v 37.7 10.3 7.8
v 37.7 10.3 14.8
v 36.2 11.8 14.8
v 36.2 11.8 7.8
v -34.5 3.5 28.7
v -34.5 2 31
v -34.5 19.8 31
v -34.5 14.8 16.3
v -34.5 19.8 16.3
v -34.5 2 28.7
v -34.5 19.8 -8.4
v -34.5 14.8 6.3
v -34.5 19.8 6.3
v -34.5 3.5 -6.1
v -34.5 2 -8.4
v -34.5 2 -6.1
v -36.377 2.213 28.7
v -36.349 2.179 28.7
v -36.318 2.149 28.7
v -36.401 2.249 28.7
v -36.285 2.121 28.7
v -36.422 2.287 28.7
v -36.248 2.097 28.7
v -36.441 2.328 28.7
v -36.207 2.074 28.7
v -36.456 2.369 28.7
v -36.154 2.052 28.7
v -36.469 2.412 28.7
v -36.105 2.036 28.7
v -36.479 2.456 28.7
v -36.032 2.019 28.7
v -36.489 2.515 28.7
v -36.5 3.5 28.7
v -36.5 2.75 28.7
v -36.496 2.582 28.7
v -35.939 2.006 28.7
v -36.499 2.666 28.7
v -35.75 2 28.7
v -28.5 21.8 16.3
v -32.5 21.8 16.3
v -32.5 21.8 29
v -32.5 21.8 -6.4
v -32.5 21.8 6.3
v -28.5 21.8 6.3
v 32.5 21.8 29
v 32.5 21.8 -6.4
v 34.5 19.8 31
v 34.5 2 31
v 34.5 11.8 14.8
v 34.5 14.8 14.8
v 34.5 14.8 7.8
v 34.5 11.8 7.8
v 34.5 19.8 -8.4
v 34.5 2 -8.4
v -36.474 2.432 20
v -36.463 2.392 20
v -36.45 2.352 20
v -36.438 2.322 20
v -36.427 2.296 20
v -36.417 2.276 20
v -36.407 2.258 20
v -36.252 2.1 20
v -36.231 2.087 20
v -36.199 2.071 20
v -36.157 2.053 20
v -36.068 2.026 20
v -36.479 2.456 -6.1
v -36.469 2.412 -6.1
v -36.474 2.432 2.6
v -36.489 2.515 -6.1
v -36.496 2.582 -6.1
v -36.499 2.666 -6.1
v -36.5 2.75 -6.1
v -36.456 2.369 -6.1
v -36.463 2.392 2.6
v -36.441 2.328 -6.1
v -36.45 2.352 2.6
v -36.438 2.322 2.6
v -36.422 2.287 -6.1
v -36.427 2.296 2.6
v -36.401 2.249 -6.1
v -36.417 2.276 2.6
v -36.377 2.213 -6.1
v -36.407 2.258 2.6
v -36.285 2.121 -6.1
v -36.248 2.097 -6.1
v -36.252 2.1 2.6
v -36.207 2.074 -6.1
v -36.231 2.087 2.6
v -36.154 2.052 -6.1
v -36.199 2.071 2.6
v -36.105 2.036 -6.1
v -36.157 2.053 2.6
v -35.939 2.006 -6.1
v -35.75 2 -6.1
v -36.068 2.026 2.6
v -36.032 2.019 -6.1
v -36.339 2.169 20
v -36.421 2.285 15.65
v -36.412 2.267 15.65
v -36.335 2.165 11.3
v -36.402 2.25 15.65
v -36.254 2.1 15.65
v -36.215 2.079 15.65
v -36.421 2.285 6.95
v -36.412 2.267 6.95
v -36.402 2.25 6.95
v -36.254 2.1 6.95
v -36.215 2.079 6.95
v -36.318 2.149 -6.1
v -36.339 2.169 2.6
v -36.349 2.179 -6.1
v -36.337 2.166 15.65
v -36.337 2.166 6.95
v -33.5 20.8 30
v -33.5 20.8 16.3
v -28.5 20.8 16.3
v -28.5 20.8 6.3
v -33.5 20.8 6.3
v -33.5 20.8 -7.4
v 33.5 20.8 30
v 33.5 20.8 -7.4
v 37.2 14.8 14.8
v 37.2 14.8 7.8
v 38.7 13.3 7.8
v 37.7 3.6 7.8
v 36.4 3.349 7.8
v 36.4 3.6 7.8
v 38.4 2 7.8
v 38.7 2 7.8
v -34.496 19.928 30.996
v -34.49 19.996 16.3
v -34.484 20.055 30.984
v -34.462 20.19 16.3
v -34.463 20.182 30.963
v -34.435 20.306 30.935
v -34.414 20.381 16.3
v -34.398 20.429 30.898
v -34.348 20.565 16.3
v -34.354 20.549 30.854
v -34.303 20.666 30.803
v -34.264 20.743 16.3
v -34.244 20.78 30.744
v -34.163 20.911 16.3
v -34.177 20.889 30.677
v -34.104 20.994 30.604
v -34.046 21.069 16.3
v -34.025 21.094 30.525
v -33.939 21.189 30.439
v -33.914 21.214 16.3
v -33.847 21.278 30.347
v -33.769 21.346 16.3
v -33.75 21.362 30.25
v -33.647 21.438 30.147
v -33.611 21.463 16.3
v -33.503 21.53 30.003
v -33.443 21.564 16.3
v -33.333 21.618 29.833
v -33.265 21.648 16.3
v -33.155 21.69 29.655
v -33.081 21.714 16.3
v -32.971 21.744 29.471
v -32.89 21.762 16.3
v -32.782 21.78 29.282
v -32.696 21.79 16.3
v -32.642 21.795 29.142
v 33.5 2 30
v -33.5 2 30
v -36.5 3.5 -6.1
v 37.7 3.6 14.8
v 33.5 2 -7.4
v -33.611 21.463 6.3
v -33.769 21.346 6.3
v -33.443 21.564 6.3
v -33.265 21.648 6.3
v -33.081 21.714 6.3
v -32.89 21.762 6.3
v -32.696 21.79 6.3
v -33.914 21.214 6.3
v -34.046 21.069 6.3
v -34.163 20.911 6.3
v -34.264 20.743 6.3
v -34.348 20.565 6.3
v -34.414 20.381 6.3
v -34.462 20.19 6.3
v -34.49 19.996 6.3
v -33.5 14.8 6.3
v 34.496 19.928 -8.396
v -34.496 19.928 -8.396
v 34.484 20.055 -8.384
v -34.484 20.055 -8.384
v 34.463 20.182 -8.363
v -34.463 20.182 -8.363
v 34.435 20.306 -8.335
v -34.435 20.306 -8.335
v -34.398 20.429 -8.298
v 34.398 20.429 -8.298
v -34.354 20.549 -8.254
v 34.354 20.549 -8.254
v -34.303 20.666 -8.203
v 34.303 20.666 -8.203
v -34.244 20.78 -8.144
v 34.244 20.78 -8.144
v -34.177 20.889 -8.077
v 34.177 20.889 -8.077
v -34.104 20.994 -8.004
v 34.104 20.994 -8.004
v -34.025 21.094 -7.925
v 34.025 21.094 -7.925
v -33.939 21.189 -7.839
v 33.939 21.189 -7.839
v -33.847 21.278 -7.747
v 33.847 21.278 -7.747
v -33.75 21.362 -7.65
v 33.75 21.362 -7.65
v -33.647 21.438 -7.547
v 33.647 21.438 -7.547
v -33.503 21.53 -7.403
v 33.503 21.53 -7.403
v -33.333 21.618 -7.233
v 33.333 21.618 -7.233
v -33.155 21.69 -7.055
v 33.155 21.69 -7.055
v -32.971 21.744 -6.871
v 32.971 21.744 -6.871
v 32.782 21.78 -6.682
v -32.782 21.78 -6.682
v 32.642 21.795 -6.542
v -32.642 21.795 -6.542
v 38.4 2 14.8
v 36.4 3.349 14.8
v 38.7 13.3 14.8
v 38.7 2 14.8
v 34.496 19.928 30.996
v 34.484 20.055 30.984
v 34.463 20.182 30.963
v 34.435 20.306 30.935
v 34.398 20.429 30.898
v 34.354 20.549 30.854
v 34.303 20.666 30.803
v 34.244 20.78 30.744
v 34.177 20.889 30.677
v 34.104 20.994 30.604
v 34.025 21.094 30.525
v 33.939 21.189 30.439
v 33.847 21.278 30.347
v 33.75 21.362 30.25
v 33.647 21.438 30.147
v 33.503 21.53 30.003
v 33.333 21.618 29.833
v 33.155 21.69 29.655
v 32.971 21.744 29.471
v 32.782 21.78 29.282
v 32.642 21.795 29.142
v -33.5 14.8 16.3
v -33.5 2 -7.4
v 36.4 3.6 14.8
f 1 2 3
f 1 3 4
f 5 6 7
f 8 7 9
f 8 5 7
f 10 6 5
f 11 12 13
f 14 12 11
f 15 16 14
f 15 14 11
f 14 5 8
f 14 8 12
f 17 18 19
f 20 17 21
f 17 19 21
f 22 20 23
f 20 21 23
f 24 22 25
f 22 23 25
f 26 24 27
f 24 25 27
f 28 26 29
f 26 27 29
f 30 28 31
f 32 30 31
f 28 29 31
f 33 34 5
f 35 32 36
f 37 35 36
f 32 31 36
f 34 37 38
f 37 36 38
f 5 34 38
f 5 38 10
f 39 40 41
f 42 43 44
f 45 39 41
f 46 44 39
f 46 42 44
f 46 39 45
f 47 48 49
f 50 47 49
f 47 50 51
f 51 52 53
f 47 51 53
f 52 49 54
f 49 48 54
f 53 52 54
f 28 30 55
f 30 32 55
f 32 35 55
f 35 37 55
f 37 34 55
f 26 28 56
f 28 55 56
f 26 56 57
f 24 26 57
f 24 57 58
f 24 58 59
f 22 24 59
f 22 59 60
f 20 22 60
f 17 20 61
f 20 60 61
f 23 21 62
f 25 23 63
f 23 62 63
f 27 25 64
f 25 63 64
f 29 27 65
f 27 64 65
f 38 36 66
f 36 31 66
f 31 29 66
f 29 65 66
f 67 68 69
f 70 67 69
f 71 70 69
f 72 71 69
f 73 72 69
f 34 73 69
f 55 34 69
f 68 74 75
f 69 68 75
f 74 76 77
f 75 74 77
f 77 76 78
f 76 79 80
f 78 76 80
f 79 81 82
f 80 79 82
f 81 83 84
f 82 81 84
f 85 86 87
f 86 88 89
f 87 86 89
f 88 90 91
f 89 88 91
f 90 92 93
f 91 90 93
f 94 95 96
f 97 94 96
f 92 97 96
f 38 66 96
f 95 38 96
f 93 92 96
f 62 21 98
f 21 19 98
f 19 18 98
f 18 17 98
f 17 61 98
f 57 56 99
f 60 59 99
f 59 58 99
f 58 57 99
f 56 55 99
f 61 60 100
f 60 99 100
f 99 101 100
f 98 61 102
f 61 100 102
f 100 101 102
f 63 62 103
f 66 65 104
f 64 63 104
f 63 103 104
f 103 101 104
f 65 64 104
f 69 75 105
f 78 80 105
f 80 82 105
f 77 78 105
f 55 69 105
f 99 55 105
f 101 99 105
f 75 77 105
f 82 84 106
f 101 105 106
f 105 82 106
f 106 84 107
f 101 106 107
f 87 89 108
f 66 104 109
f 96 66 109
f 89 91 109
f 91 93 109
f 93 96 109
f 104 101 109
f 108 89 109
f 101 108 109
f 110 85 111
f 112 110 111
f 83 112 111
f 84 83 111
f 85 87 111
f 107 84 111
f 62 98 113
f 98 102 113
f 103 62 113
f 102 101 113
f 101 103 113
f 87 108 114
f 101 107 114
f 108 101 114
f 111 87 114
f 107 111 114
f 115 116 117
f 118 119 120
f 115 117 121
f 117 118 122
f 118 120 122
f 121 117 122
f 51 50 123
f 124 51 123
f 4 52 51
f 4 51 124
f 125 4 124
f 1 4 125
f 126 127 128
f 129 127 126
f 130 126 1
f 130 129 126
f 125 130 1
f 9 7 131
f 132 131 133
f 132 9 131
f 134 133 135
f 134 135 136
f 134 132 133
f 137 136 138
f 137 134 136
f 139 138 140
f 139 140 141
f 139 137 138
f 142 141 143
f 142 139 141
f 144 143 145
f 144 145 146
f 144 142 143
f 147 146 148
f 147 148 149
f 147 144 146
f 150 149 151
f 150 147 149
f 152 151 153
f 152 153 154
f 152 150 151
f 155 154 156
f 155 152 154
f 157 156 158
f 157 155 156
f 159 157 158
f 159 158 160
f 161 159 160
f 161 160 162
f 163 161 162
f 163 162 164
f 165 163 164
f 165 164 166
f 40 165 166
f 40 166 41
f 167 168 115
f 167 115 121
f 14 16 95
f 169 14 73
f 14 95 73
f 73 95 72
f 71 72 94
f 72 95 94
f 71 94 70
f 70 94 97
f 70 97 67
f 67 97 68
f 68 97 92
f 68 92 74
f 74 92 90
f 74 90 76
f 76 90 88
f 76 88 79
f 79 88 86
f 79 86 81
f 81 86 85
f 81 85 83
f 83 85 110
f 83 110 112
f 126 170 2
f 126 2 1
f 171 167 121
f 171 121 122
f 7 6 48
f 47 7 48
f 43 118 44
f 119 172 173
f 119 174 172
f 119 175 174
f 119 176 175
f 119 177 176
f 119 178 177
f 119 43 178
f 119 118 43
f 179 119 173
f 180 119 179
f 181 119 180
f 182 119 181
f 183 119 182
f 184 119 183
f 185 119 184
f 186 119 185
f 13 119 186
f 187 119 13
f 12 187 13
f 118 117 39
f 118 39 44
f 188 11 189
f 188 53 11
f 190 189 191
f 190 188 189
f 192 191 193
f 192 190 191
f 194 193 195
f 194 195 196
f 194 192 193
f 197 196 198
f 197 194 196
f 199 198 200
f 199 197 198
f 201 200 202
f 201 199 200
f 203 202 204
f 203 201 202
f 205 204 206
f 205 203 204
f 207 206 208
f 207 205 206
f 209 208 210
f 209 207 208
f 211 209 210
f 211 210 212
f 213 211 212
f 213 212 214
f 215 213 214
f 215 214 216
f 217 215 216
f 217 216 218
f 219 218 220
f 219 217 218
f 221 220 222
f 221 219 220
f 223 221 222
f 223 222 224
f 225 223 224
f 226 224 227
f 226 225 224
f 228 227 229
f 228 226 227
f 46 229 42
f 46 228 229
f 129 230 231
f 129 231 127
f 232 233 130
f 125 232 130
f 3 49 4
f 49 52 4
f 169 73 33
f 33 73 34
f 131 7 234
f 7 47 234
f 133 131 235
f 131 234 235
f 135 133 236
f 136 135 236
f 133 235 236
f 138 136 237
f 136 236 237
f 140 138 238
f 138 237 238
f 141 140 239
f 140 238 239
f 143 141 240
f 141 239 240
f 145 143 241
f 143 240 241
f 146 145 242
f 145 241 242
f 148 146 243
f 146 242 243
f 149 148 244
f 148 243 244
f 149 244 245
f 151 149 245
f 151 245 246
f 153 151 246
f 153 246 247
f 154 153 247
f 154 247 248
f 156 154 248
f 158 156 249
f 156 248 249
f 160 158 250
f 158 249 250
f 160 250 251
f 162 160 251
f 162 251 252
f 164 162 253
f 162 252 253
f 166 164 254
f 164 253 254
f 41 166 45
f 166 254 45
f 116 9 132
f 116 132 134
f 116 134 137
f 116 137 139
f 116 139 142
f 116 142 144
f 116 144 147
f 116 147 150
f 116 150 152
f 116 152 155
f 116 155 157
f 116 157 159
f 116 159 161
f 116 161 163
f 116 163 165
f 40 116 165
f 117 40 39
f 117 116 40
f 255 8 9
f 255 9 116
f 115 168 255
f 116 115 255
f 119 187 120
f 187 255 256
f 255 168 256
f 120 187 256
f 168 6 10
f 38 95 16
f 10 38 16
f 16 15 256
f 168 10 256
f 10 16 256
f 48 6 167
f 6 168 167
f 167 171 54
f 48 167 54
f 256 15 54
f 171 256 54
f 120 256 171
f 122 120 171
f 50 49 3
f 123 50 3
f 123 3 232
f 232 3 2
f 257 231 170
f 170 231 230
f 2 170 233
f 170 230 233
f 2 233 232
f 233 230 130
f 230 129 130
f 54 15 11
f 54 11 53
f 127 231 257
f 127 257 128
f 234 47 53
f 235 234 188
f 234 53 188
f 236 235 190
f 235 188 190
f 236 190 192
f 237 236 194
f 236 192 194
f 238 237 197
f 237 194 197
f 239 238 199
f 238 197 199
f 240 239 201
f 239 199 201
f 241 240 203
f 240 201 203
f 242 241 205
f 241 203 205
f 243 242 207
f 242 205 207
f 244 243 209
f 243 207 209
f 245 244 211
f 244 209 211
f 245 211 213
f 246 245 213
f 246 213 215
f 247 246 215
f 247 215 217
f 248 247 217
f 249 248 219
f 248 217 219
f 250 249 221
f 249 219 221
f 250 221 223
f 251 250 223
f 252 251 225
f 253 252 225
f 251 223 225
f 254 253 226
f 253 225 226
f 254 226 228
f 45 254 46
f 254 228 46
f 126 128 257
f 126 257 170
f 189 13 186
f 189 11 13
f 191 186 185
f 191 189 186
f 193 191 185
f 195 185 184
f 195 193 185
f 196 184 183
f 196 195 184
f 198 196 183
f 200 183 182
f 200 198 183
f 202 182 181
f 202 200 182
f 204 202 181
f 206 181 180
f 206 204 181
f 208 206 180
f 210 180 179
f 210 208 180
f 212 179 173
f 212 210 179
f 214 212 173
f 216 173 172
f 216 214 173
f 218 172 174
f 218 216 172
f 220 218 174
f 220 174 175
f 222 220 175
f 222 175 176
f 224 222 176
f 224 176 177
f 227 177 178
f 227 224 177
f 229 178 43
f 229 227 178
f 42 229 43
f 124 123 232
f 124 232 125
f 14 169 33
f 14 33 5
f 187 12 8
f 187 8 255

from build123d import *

# Parameters (mm, degrees)
EXTRUDE_THIN_START                    = 2
EXTRUDE_THIN_HOLDER_WALLS_OUTLINE_W   = 69
EXTRUDE_THIN_HOLDER_WALLS_OUTLINE_H   = 39.4
EXTRUDE_THIN_HOLDER_WALLS_OUTLINE_W_2 = 67
EXTRUDE_THIN_HOLDER_WALLS_OUTLINE_H_2 = 37.4
EXTRUDE_THIN_HOLDER_WALLS_DEPTH       = 19.8
BOSS_EXTRUDE_START                    = 20.8
BATTERY_HOLDER_AREA_8_W               = 28.6
BATTERY_HOLDER_AREA_8_H               = 37.4
BATTERY_HOLDER_AREA_8_W_2             = 5
BATTERY_HOLDER_AREA_8_H_2             = 10
BOSS_EXTRUDE_HOLDER_TOP_DEPTH         = 1
CUT_EXTRUDE_START                     = 14.8
BATTERY_HOLDER_AREA_6_W               = 1
BATTERY_HOLDER_AREA_6_H               = 10
BATTERY_HOLDER_AREA_6_W_2             = 5
CUT_EXTRUDE_BATTERY_CABLE_DEPTH       = 7
BOSS_EXTRUDE_START_2                  = 2
BOSS_EXTRUDE_SLIDE_CLAMP_DEPTH        = 1.5
FILLET_SLIDE_CLAMP_SIZE               = 0.75
FILLET_HOLDER_EDGES_R                 = 2
BATTERY_HOLDER_AREA_6_2_W             = 1
BATTERY_HOLDER_AREA_6_2_H             = 7
EXTRUDE_THIN_HOLDER_CLIPS_DEPTH       = 12.8
BOSS_EXTRUDE_START_3                  = 14.8
BATTERY_HOLDER_AREA_6_3_W             = 3
BATTERY_HOLDER_AREA_6_3_H             = 7
BATTERY_HOLDER_AREA_6_3_W_2           = 1.2
BOSS_EXTRUDE_HOLDER_CLIP_BASES_DEPTH  = 3
CHAMFER_HOLDER_CLIP_BASES_SIZE        = 1.5
BATTERY_HOLDER_AREA_6_4_W             = 2.3
BATTERY_HOLDER_AREA_6_4_H             = 7
EXTRUDE_THIN_HOLDER_CLIP_HOOK_DEPTH   = 1.6
CHAMFER_HOLDER_CLIP_HOOK_SIZE         = 1.349017034
CHAMFER_HOLDER_CLIP_HOOK_SIZE2        = 2


with BuildPart() as part:
    # Extrude-Thin holder walls: read off the stored shape, not the designer's step
    # Extrude-Thin holder walls outline → Extrude-Thin holder walls (new body)
    with BuildSketch(Plane(origin=(0, 0, 0), x_dir=(1, 0, 0), z_dir=(0, 1, 0)).offset(EXTRUDE_THIN_START)):
        with Locations((0, -11.3)):
            Rectangle(EXTRUDE_THIN_HOLDER_WALLS_OUTLINE_W, EXTRUDE_THIN_HOLDER_WALLS_OUTLINE_H)
        with Locations((0, -11.3)):
            Rectangle(EXTRUDE_THIN_HOLDER_WALLS_OUTLINE_W_2, EXTRUDE_THIN_HOLDER_WALLS_OUTLINE_H_2, mode=Mode.SUBTRACT)
    extrude(amount=EXTRUDE_THIN_HOLDER_WALLS_DEPTH)

    # Battery holder area_8 → Boss-Extrude holder top (add)
    with BuildSketch(Plane(origin=(0, 0, 0), x_dir=(1, 0, 0), z_dir=(0, 1, 0)).offset(BOSS_EXTRUDE_START)):
        Polygon((0, -30), (0, 7.4), (-33.5, 7.4), (-33.5, 6.1), (-33.5, -6.3), (-28.5, -6.3), (-28.5, -16.3), (-33.5, -16.3), (-33.5, -28.7), (-33.5, -30), align=None)
        with Locations((14.3, -11.3)):
            Rectangle(BATTERY_HOLDER_AREA_8_W, BATTERY_HOLDER_AREA_8_H)
        Polygon((33.5, 7.4), (28.6, 7.4), (28.6, -30), (33.5, -30), (33.5, -14.8), (33.5, -7.8), align=None)
        with Locations((-31, -11.3)):
            Rectangle(BATTERY_HOLDER_AREA_8_W_2, BATTERY_HOLDER_AREA_8_H_2)
    extrude(amount=BOSS_EXTRUDE_HOLDER_TOP_DEPTH)

    # Battery holder area_6 → Cut-Extrude battery cable (cut)
    with BuildSketch(Plane(origin=(0, 0, 0), x_dir=(1, 0, 0), z_dir=(0, 1, 0)).offset(CUT_EXTRUDE_START)):
        with Locations((-34, -11.3)):
            Rectangle(BATTERY_HOLDER_AREA_6_W, BATTERY_HOLDER_AREA_6_H)
        with Locations((-31, -11.3)):
            Rectangle(BATTERY_HOLDER_AREA_6_W_2, BATTERY_HOLDER_AREA_6_H)
    extrude(amount=CUT_EXTRUDE_BATTERY_CABLE_DEPTH, mode=Mode.SUBTRACT)

    # Battery holder area_8 2 → Boss-Extrude slide clamp (add)
    with BuildSketch(Plane(origin=(0, 0, 0), x_dir=(1, 0, 0), z_dir=(0, 1, 0)).offset(BOSS_EXTRUDE_START_2)):
        Polygon((-36.5, -28.7), (-33.5, -28.7), (-33.5, -16.3), (-34.5, -16.3), (-34.5, -6.3), (-33.5, -6.3), (-33.5, 6.1), (-36.5, 6.1), align=None)
    extrude(amount=BOSS_EXTRUDE_SLIDE_CLAMP_DEPTH)

    # Fillet slide clamp
    # a fillet whose section is not a circle: 0.75 mm, written as the material it takes off along each edge
    with BuildSketch(Plane(origin=(-36.5, 2, -7.975), x_dir=(0, 1, 0), z_dir=(0, 0, 1))) as fillet_slide_clamp_piece_1:
        with BuildLine():
            add(Edge.make_bspline([(FILLET_SLIDE_CLAMP_SIZE, 0), (FILLET_SLIDE_CLAMP_SIZE * 0.831801948466, 0), (FILLET_SLIDE_CLAMP_SIZE * 0.663603896932, 0), (FILLET_SLIDE_CLAMP_SIZE * 0.292893218813, -FILLET_SLIDE_CLAMP_SIZE * 0.0716919198361), (FILLET_SLIDE_CLAMP_SIZE * 0.0716919198361, -FILLET_SLIDE_CLAMP_SIZE * 0.292893218813), (0, -FILLET_SLIDE_CLAMP_SIZE * 0.663603896932), (0, -FILLET_SLIDE_CLAMP_SIZE * 0.831801948466), (0, -FILLET_SLIDE_CLAMP_SIZE)], knots=[0, 0, 0, 0, 0, 0, 0.5, 0.5, 1, 1, 1, 1, 1, 1], degree=5))
            Line((0, -FILLET_SLIDE_CLAMP_SIZE), (0, 0))
            Line((0, 0), (FILLET_SLIDE_CLAMP_SIZE, 0))
        make_face()
    extrude(amount=38.55, mode=Mode.SUBTRACT)

    # Fillet holder edges
    fillet_holder_edges_edges = [part.edges().sort_by_distance(p)[0] for p in [
        (34.5, 21.8, 11.3),
        (0, 21.8, 31),
        (-34.5, 21.8, 23.65),
        (0, 21.8, -8.4),
        (-34.5, 21.8, -1.05),
    ]]
    fillet(fillet_holder_edges_edges, radius=FILLET_HOLDER_EDGES_R)



with BuildPart() as body_2:
    # Battery holder area_6 2 → Extrude-Thin holder clips (new body)
    with BuildSketch(Plane(origin=(0, 0, 0), x_dir=(1, 0, 0), z_dir=(0, 1, 0)).offset(EXTRUDE_THIN_START)):
        with Locations((38.2, -11.3)):
            Rectangle(BATTERY_HOLDER_AREA_6_2_W, BATTERY_HOLDER_AREA_6_2_H)
    extrude(amount=EXTRUDE_THIN_HOLDER_CLIPS_DEPTH)


with BuildPart() as part_1:
    add(part.part)

    add(body_2.part)  # Boss-Extrude holder clip bases merges body 2
    # Battery holder area_6 3 → Boss-Extrude holder clip bases (add)
    with BuildSketch(Plane(origin=(0, 0, 0), x_dir=(1, 0, 0), z_dir=(0, 1, 0)).offset(BOSS_EXTRUDE_START_3)):
        with Locations((36.2, -11.3)):
            Rectangle(BATTERY_HOLDER_AREA_6_3_W, BATTERY_HOLDER_AREA_6_3_H)
        with Locations((34.1, -11.3)):
            Rectangle(BATTERY_HOLDER_AREA_6_3_W_2, BATTERY_HOLDER_AREA_6_3_H)
    extrude(amount=-BOSS_EXTRUDE_HOLDER_CLIP_BASES_DEPTH)

    # Chamfer holder clip bases
    chamfer_holder_clip_bases_edges = [part_1.edges().sort_by_distance(p)[0] for p in [
        (37.7, 11.8, 11.3),
        (38.7, 14.8, 11.3),
    ]]
    chamfer(chamfer_holder_clip_bases_edges, length=CHAMFER_HOLDER_CLIP_BASES_SIZE)

    # Battery holder area_6 4 → Extrude-Thin holder clip hook (add)
    with BuildSketch(Plane(origin=(0, 0, 0), x_dir=(1, 0, 0), z_dir=(0, 1, 0)).offset(EXTRUDE_THIN_START)):
        with Locations((37.55, -11.3)):
            Rectangle(BATTERY_HOLDER_AREA_6_4_W, BATTERY_HOLDER_AREA_6_4_H)
    extrude(amount=EXTRUDE_THIN_HOLDER_CLIP_HOOK_DEPTH)

    # Chamfer holder clip hook
    chamfer_holder_clip_hook_edges = [part_1.edges().sort_by_distance(p)[0] for p in [
        (36.4, 2, 11.3),
    ]]
    chamfer_holder_clip_hook_side = [part_1.faces().sort_by_distance(p)[0] for p in [
        (36.4, 2.8, 11.3),
    ]]
    chamfer(chamfer_holder_clip_hook_edges, length=CHAMFER_HOLDER_CLIP_HOOK_SIZE, length2=CHAMFER_HOLDER_CLIP_HOOK_SIZE2, reference=chamfer_holder_clip_hook_side[0])


solid = part_1.part
